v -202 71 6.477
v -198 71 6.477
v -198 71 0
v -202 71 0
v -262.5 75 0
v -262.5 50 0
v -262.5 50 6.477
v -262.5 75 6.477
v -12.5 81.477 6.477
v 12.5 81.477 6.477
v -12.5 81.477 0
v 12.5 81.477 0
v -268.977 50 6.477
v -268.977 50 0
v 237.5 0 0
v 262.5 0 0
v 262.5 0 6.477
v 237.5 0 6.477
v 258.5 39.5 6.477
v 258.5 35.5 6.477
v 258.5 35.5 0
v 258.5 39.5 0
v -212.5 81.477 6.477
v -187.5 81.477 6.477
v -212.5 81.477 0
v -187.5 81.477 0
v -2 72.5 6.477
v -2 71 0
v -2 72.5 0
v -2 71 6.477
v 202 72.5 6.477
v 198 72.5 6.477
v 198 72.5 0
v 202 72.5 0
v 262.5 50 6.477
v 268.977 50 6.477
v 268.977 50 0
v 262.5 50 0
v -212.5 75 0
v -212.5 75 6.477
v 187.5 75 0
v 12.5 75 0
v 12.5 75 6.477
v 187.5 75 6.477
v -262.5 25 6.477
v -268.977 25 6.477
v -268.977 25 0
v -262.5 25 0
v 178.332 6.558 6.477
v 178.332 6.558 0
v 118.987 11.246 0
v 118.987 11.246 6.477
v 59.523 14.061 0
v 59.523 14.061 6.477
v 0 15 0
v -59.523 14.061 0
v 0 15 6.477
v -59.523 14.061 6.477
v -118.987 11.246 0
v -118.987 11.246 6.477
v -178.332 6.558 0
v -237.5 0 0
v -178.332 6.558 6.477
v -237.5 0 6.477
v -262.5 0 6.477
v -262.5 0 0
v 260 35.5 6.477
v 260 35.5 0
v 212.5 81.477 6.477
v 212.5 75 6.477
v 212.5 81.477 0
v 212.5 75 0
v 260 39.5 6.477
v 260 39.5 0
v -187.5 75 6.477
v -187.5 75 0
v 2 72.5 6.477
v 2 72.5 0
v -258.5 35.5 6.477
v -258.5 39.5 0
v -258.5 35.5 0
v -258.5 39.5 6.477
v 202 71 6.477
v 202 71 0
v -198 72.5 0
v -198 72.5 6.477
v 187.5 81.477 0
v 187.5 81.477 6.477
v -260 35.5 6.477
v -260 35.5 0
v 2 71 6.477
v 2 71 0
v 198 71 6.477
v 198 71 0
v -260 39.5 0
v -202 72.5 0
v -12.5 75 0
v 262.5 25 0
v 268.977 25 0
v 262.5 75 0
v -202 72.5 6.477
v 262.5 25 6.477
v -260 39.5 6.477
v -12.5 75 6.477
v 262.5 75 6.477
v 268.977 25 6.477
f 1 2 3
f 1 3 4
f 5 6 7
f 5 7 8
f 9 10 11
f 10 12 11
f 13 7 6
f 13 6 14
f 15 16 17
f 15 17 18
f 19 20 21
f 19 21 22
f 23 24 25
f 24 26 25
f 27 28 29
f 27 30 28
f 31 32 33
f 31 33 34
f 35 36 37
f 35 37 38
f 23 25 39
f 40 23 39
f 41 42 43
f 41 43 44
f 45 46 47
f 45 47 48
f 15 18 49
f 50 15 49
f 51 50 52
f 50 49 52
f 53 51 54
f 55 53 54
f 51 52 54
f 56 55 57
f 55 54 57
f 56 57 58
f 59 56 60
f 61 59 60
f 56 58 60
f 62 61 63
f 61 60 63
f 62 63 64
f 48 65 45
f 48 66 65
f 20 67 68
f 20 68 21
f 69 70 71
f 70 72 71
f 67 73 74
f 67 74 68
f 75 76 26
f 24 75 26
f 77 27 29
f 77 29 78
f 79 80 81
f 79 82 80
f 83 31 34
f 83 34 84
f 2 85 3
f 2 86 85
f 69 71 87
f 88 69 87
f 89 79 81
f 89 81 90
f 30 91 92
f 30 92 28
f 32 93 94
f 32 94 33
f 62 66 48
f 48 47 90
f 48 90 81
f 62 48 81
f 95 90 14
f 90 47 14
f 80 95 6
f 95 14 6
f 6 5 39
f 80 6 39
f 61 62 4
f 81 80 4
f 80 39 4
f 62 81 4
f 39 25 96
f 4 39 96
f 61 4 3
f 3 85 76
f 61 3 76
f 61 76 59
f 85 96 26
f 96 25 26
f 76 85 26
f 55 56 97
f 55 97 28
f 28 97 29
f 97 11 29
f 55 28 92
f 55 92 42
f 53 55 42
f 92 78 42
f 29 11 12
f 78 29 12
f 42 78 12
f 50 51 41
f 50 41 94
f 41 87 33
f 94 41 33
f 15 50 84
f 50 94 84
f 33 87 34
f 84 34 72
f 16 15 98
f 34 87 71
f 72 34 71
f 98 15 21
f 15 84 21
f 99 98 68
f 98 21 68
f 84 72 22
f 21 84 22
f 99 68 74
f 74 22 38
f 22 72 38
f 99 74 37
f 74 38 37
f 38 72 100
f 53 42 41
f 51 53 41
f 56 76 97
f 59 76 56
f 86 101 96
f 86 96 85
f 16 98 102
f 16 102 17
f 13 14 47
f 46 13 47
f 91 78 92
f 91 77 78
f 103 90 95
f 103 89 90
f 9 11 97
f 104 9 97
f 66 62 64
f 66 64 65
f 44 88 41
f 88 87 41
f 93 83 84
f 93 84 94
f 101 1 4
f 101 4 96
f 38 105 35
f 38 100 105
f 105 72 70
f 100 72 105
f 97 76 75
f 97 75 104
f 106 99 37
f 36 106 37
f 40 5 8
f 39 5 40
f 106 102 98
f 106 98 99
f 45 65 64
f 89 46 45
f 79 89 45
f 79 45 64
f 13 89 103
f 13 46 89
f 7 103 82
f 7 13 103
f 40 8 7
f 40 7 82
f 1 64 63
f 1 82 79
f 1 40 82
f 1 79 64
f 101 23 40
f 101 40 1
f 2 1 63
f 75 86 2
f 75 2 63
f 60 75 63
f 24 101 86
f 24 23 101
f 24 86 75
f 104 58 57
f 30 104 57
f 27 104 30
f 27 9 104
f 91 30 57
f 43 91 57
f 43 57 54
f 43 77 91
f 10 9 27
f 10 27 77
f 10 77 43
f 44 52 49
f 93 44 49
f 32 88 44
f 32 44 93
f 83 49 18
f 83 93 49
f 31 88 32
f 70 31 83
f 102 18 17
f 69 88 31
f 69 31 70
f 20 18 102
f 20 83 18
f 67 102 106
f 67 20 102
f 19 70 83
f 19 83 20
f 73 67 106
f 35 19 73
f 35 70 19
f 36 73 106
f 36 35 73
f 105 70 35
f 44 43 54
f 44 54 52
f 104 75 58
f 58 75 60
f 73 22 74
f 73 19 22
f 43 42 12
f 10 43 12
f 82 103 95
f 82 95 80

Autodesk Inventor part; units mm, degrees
ref_plane "YZ Plane" through (0, 0, 0) normal (1, 0, 0) x (0, 1, 0)
ref_plane "XZ Plane" through (0, 0, 0) normal (0, 1, 0) x (-1, 0, 0)
ref_plane "XY Plane" through (0, 0, 0) normal (0, 0, 1) x (1, 0, 0)
sketch "Sketch1" plane through (0, 0, 0) normal (0, 0, 1) x (1, 0, 0)
  line L0 (-262.5, 75) -> (262.5, 75)
  line L1 (262.5, 75) -> (262.5, 0)
  line L2 (262.5, 0) -> (-262.5, 0)
  line L3 (-262.5, 0) -> (-262.5, 75)
  line L4 (-262.5, 50) -> (-268.977, 50)
  line L5 (-268.977, 50) -> (-268.977, 25)
  line L6 (-268.977, 25) -> (-262.5, 25)
  line L7 (-262.5, 25) -> (-262.5, 50)
  line L8 (-212.5, 75) -> (-187.5, 75)
  line L9 (-187.5, 75) -> (-187.5, 81.477)
  line L10 (-187.5, 81.477) -> (-212.5, 81.477)
  line L11 (-212.5, 81.477) -> (-212.5, 75)
  line L12 (-12.5, 75) -> (12.5, 75)
  line L13 (12.5, 75) -> (12.5, 81.477)
  line L14 (12.5, 81.477) -> (-12.5, 81.477)
  line L15 (-12.5, 81.477) -> (-12.5, 75)
  point P0 (0, 0)
  point P1 (0, 0)
  point P2 (-268.977, 37.5)
  point P3 (-262.5, 37.5)
  point P4 (0, 81.477)
  point P5 (0, 75)
  dimension "d0" = 525
  dimension "d2" = 75
  dimension "d3" = 25
  dimension "d4" = 6.477
  dimension "d5" = 50
extrude "Extrusion1" add sketch "Sketch1" along normal blind 6.477
mirror "Mirror1" about plane through (0, 0, 0) normal (1, 0, 0) of "Extrusion1"
sketch "Sketch2" plane through (0, 0, 6.477) normal (0, 0, 1) x (1, 0, 0)
  line L0 (-187.5, 81.477) -> (-212.5, 81.477) projected
  line L1 (-262.5, 75) -> (-262.5, 50) projected
  line L2 (-268.977, 50) -> (-268.977, 25) projected
  line L3 (12.5, 81.477) -> (-12.5, 81.477) projected
  line L4 (-12.5, 75) -> (-187.5, 75) projected
  line L5 (-260, 39.5) -> (-258.5, 39.5)
  line L6 (-258.5, 39.5) -> (-258.5, 35.5)
  line L7 (-258.5, 35.5) -> (-260, 35.5)
  line L8 (-260, 35.5) -> (-260, 39.5)
  line L9 (-202, 72.5) -> (-198, 72.5)
  line L10 (-198, 72.5) -> (-198, 71)
  line L11 (-198, 71) -> (-202, 71)
  line L12 (-202, 71) -> (-202, 72.5)
  line L13 (-2, 72.5) -> (2, 72.5)
  line L14 (2, 72.5) -> (2, 71)
  line L15 (2, 71) -> (-2, 71)
  line L16 (-2, 71) -> (-2, 72.5)
  point P0 (0, 0)
  point P1 (-268.977, 37.5)
  point P2 (-260, 37.5)
  point P3 (-200, 72.5)
  point P4 (-200, 81.477)
  point P5 (0, 72.5)
  point P6 (0, 81.477)
  dimension "d8" = 4
  dimension "d10" = 1.5
  dimension "d11" = 2.5
  dimension "d13" = 2.5
extrude "Extrusion2" cut sketch "Sketch2" against normal through all
mirror "Mirror2" about plane through (0, 0, 0) normal (1, 0, 0) of "Extrusion2"
sketch "Sketch3" plane through (0, 0, 6.477) normal (0, 0, 1) x (1, 0, 0)
  line L0 (-262.5, 0) -> (262.5, 0) projected
  arc A0 (237.5, 0) -> (-237.5, 0) centre (0, -1872.7083) ccw
  point P0 (0, 0)
  point P1 (0, 15)
  point P2 (0, 0)
  dimension "d16" = 25
  dimension "d17" = 15
extrude "Extrusion3" cut sketch "Sketch3" against normal through all
properties part number "STRUT"
